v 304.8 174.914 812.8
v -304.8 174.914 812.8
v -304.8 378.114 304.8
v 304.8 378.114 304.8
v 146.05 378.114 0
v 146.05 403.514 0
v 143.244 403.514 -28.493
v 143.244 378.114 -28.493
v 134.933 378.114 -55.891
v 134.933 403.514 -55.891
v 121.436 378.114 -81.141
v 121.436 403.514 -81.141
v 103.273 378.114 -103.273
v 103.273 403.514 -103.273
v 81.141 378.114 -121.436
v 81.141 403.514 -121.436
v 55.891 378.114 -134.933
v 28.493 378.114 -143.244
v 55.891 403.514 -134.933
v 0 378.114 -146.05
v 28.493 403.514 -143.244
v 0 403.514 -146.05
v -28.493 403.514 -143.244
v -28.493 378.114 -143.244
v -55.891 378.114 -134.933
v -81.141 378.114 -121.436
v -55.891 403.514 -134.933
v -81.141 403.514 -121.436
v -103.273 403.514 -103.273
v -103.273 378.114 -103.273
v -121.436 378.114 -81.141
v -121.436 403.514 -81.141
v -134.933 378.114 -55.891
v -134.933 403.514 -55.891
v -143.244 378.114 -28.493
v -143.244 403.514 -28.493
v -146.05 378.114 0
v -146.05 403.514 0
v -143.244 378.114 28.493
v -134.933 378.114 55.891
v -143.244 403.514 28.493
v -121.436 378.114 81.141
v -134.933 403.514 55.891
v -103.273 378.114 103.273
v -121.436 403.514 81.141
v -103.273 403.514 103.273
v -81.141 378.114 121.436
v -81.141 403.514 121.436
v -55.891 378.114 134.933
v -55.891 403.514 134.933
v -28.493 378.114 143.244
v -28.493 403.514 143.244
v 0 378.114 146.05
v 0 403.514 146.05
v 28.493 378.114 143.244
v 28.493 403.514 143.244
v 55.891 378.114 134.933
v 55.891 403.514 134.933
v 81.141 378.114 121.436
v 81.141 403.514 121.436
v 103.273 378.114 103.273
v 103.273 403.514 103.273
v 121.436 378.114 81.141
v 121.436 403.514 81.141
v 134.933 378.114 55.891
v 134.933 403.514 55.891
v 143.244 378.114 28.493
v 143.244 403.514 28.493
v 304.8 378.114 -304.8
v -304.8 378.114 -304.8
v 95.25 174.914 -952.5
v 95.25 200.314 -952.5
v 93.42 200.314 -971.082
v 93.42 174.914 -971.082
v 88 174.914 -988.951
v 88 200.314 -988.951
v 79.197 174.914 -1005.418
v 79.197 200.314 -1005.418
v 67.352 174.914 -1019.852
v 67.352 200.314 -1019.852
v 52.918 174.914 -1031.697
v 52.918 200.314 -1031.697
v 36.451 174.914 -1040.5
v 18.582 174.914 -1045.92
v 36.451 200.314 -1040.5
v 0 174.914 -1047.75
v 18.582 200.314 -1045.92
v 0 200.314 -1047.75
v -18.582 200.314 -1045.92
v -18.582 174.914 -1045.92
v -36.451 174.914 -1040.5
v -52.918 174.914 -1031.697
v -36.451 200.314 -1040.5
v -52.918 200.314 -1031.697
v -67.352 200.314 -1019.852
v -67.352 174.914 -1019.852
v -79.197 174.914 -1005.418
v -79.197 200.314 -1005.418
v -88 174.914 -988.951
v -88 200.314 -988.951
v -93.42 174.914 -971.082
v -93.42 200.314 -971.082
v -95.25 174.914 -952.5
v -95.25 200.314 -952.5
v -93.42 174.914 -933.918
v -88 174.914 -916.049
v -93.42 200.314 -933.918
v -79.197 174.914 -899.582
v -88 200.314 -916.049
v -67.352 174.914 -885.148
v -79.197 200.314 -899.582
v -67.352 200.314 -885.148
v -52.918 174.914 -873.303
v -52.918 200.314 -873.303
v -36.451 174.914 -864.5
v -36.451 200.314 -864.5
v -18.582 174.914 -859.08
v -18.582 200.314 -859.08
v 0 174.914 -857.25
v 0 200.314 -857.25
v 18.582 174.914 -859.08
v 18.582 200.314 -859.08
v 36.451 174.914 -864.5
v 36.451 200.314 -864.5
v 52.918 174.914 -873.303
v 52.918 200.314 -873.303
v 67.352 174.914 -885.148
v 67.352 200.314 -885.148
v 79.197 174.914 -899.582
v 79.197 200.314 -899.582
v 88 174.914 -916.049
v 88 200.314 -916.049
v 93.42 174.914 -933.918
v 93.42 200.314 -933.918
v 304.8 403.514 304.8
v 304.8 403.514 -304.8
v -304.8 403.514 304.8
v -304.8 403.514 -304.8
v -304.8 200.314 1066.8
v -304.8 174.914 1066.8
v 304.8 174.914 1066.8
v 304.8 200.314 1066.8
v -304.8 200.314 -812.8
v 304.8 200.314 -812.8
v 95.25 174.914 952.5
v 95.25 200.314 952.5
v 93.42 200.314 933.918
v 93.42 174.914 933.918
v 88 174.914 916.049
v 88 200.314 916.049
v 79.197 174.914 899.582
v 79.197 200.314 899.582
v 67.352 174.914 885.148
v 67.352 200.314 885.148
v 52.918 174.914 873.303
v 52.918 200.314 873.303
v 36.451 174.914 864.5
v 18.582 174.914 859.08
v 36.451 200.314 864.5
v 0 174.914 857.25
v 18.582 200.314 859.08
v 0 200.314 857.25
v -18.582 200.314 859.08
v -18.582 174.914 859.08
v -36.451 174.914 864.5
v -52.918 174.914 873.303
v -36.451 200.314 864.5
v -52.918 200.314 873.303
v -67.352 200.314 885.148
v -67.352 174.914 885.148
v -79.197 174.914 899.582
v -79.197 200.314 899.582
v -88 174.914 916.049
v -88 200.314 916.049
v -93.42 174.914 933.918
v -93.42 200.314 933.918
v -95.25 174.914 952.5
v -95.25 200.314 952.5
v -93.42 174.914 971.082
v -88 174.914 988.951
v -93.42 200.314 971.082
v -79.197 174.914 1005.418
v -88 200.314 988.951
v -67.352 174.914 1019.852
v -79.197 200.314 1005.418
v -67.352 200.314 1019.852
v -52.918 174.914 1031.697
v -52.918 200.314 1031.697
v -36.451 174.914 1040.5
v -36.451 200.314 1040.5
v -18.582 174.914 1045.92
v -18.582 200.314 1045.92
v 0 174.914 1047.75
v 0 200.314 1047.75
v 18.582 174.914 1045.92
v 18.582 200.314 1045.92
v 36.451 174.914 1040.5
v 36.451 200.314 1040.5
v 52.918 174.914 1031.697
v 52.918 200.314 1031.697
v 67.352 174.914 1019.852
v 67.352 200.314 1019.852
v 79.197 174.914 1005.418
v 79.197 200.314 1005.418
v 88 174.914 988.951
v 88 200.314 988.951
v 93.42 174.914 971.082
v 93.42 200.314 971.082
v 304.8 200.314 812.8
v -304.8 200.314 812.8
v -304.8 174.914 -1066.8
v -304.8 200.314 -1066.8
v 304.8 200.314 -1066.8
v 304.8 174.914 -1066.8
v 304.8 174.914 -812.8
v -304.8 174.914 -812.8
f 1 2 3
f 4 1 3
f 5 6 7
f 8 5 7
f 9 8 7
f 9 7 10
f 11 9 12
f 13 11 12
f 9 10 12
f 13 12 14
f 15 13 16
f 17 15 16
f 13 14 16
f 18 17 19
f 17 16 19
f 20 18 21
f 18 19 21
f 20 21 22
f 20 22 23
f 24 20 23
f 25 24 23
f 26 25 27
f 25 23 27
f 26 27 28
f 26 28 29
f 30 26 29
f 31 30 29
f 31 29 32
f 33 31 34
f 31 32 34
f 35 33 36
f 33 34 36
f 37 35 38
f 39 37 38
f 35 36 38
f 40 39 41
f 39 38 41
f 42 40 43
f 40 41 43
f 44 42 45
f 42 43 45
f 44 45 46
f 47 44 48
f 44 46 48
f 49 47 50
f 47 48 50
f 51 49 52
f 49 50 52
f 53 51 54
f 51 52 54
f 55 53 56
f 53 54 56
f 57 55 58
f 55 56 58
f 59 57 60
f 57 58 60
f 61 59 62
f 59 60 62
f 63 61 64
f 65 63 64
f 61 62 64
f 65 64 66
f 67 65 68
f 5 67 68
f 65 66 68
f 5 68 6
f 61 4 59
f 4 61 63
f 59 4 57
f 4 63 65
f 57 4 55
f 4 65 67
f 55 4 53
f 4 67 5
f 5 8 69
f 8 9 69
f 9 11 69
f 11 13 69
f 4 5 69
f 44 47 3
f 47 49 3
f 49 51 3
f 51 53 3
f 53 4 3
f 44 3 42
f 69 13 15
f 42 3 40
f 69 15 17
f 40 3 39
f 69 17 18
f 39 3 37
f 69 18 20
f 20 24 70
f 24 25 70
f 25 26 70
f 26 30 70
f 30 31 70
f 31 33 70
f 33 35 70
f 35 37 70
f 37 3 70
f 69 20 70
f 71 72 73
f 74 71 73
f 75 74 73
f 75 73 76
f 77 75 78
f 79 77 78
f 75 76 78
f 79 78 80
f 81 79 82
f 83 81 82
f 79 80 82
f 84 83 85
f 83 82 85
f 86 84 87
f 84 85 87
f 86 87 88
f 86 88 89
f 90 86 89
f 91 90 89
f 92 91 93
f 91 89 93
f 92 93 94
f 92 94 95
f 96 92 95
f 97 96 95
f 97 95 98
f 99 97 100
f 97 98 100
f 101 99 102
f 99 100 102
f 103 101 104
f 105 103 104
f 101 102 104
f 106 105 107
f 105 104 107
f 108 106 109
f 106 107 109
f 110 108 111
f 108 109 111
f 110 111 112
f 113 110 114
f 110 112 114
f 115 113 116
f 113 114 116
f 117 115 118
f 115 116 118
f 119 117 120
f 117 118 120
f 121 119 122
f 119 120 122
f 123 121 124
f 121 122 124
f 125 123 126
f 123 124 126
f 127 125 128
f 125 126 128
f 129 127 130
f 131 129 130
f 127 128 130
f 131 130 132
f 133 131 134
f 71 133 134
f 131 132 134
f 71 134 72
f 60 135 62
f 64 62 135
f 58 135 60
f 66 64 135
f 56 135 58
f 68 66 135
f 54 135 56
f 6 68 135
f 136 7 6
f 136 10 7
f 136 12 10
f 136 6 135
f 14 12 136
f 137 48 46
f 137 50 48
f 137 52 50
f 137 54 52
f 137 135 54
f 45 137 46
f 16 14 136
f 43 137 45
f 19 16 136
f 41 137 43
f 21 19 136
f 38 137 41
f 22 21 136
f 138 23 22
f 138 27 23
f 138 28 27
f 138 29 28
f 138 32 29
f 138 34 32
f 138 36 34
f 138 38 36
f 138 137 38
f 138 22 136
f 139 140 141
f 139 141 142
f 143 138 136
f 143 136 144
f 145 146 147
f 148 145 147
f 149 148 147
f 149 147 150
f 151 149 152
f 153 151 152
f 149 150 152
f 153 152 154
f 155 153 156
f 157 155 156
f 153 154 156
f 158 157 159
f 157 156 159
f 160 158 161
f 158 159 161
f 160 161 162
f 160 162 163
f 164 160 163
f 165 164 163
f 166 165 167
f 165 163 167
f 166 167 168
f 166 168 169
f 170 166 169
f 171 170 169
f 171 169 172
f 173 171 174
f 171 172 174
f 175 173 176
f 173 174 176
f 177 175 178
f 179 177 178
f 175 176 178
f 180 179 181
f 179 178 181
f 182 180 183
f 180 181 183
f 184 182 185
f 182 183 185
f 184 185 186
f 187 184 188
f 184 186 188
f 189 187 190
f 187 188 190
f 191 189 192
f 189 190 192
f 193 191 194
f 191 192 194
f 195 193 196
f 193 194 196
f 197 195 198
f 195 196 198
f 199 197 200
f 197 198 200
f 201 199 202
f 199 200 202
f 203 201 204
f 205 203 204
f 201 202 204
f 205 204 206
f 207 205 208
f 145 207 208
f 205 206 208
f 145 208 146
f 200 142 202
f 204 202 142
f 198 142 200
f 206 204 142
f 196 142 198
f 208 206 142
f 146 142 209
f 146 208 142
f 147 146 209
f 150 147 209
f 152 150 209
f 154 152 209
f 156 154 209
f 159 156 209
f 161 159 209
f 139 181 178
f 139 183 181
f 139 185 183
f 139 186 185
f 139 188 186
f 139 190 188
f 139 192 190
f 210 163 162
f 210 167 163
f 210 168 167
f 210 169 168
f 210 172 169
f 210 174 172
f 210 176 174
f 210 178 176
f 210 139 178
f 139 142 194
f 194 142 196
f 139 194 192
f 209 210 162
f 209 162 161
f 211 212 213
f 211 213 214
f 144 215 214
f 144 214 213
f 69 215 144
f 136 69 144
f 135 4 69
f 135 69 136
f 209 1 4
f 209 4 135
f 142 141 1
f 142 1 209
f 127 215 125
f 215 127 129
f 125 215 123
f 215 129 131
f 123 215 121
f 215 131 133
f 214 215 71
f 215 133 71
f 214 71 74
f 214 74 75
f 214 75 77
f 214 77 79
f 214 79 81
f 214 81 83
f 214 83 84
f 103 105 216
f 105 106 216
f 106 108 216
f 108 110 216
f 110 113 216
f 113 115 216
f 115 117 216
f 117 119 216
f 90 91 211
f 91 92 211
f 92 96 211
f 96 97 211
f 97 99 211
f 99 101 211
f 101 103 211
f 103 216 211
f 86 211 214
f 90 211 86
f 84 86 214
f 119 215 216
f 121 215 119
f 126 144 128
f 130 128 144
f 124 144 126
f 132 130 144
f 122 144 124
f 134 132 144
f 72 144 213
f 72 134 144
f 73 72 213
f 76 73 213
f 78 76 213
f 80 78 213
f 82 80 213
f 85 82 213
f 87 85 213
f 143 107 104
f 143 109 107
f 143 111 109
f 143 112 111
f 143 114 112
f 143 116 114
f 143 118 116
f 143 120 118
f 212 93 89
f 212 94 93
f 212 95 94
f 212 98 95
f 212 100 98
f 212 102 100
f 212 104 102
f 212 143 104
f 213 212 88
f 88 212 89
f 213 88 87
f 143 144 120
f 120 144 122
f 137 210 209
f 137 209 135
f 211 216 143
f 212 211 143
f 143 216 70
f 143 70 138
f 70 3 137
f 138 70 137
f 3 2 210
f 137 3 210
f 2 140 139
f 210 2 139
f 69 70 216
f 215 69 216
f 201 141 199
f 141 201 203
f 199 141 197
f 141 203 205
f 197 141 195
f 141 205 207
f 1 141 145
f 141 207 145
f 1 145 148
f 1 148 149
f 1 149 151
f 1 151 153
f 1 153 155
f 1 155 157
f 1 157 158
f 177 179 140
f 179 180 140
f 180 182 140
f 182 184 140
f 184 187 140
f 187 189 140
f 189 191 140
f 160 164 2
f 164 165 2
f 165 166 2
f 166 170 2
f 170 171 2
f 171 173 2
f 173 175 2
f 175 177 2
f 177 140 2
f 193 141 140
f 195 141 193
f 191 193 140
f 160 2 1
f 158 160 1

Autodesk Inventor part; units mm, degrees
ref_plane "YZ Plane" through (0, 0, 0) normal (1, 0, 0) x (0, 1, 0)
ref_plane "XZ Plane" through (0, 0, 0) normal (0, 1, 0) x (-1, 0, 0)
ref_plane "XY Plane" through (0, 0, 0) normal (0, 0, 1) x (1, 0, 0)
sketch "Sketch1" plane through (0, 0, 0) normal (1, 0, 0) x (0, 1, 0)
  line L0 (174.9139, 1066.8) -> (200.3139, 1066.8)
  line L1 (200.3139, 1066.8) -> (200.3139, 812.8)
  line L2 (200.3139, 812.8) -> (403.5139, 304.8)
  line L3 (403.5139, 304.8) -> (403.5139, -304.8)
  line L4 (403.5139, -304.8) -> (200.3139, -812.8)
  line L5 (200.3139, -812.8) -> (200.3139, -1066.8)
  line L6 (174.9139, 1066.8) -> (174.9139, 812.8)
  line L7 (174.9139, 812.8) -> (378.1139, 304.8)
  line L8 (378.1139, 304.8) -> (378.1139, -304.8)
  line L9 (174.9139, -935.25) -> (174.9139, 993.0491) construction
  line L10 (174.9139, 681.698) -> (174.9139, -514.0179) construction
  line L11 (200.3139, -1066.8) -> (174.9139, -1066.8)
  line L12 (378.1139, -304.8) -> (174.9139, -812.8)
  line L13 (174.9139, -812.8) -> (174.9139, -1066.8)
  point P0 (0, 0)
  dimension "d0" = 254
  dimension "d1" = 508
  dimension "d2" = 609.6
  dimension "d3" = 508
  dimension "d4" = 254
  dimension "d6" = 304.8
  dimension "d8" = 25.4
  dimension "d10" = 203.2
  dimension "d26" = 25.4
extrude "Extrusion1" add sketch "Sketch1" along normal mid plane 609.6
sketch "Sketch2" plane through (-304.8, 200.3139, -812.8) normal (0, 1, 0) x (1, 0, 0)
  circle A0 centre (304.8, 139.7) radius 95.25
  line L0 (609.6, 254) -> (0, 254) projected
  line L1 (0, 0) -> (0, 254) projected
  circle A1 centre (304.8, -1765.3) radius 95.25
  line L2 (609.6, -1879.6) -> (0, -1879.6) projected
  line L3 (609.6, -1625.6) -> (609.6, -1879.6) projected
  point P0 (304.8, -812.8)
  dimension "d13" = 190.5
  dimension "d14" = 114.3
  dimension "d15" = 304.8
  dimension "d16" = 190.5
  dimension "d17" = 114.3
  dimension "d18" = 304.8
extrude "Extrusion2" cut sketch "Sketch2" against normal up to next
sketch "Sketch3" plane through (-304.8, 403.5139, 304.8) normal (0, 1, 0) x (1, 0, 0)
  circle A0 centre (304.8, 304.8) radius 146.05
  line L0 (0, 609.6) -> (0, 0) projected
  line L1 (609.6, 609.6) -> (0, 609.6) projected
  point P0 (304.8, 304.8)
  dimension "d21" = 292.1
  dimension "d22" = 304.8
  dimension "d23" = 304.8
extrude "Extrusion3" cut sketch "Sketch3" against normal up to next
properties part number "Up_cam_support"
